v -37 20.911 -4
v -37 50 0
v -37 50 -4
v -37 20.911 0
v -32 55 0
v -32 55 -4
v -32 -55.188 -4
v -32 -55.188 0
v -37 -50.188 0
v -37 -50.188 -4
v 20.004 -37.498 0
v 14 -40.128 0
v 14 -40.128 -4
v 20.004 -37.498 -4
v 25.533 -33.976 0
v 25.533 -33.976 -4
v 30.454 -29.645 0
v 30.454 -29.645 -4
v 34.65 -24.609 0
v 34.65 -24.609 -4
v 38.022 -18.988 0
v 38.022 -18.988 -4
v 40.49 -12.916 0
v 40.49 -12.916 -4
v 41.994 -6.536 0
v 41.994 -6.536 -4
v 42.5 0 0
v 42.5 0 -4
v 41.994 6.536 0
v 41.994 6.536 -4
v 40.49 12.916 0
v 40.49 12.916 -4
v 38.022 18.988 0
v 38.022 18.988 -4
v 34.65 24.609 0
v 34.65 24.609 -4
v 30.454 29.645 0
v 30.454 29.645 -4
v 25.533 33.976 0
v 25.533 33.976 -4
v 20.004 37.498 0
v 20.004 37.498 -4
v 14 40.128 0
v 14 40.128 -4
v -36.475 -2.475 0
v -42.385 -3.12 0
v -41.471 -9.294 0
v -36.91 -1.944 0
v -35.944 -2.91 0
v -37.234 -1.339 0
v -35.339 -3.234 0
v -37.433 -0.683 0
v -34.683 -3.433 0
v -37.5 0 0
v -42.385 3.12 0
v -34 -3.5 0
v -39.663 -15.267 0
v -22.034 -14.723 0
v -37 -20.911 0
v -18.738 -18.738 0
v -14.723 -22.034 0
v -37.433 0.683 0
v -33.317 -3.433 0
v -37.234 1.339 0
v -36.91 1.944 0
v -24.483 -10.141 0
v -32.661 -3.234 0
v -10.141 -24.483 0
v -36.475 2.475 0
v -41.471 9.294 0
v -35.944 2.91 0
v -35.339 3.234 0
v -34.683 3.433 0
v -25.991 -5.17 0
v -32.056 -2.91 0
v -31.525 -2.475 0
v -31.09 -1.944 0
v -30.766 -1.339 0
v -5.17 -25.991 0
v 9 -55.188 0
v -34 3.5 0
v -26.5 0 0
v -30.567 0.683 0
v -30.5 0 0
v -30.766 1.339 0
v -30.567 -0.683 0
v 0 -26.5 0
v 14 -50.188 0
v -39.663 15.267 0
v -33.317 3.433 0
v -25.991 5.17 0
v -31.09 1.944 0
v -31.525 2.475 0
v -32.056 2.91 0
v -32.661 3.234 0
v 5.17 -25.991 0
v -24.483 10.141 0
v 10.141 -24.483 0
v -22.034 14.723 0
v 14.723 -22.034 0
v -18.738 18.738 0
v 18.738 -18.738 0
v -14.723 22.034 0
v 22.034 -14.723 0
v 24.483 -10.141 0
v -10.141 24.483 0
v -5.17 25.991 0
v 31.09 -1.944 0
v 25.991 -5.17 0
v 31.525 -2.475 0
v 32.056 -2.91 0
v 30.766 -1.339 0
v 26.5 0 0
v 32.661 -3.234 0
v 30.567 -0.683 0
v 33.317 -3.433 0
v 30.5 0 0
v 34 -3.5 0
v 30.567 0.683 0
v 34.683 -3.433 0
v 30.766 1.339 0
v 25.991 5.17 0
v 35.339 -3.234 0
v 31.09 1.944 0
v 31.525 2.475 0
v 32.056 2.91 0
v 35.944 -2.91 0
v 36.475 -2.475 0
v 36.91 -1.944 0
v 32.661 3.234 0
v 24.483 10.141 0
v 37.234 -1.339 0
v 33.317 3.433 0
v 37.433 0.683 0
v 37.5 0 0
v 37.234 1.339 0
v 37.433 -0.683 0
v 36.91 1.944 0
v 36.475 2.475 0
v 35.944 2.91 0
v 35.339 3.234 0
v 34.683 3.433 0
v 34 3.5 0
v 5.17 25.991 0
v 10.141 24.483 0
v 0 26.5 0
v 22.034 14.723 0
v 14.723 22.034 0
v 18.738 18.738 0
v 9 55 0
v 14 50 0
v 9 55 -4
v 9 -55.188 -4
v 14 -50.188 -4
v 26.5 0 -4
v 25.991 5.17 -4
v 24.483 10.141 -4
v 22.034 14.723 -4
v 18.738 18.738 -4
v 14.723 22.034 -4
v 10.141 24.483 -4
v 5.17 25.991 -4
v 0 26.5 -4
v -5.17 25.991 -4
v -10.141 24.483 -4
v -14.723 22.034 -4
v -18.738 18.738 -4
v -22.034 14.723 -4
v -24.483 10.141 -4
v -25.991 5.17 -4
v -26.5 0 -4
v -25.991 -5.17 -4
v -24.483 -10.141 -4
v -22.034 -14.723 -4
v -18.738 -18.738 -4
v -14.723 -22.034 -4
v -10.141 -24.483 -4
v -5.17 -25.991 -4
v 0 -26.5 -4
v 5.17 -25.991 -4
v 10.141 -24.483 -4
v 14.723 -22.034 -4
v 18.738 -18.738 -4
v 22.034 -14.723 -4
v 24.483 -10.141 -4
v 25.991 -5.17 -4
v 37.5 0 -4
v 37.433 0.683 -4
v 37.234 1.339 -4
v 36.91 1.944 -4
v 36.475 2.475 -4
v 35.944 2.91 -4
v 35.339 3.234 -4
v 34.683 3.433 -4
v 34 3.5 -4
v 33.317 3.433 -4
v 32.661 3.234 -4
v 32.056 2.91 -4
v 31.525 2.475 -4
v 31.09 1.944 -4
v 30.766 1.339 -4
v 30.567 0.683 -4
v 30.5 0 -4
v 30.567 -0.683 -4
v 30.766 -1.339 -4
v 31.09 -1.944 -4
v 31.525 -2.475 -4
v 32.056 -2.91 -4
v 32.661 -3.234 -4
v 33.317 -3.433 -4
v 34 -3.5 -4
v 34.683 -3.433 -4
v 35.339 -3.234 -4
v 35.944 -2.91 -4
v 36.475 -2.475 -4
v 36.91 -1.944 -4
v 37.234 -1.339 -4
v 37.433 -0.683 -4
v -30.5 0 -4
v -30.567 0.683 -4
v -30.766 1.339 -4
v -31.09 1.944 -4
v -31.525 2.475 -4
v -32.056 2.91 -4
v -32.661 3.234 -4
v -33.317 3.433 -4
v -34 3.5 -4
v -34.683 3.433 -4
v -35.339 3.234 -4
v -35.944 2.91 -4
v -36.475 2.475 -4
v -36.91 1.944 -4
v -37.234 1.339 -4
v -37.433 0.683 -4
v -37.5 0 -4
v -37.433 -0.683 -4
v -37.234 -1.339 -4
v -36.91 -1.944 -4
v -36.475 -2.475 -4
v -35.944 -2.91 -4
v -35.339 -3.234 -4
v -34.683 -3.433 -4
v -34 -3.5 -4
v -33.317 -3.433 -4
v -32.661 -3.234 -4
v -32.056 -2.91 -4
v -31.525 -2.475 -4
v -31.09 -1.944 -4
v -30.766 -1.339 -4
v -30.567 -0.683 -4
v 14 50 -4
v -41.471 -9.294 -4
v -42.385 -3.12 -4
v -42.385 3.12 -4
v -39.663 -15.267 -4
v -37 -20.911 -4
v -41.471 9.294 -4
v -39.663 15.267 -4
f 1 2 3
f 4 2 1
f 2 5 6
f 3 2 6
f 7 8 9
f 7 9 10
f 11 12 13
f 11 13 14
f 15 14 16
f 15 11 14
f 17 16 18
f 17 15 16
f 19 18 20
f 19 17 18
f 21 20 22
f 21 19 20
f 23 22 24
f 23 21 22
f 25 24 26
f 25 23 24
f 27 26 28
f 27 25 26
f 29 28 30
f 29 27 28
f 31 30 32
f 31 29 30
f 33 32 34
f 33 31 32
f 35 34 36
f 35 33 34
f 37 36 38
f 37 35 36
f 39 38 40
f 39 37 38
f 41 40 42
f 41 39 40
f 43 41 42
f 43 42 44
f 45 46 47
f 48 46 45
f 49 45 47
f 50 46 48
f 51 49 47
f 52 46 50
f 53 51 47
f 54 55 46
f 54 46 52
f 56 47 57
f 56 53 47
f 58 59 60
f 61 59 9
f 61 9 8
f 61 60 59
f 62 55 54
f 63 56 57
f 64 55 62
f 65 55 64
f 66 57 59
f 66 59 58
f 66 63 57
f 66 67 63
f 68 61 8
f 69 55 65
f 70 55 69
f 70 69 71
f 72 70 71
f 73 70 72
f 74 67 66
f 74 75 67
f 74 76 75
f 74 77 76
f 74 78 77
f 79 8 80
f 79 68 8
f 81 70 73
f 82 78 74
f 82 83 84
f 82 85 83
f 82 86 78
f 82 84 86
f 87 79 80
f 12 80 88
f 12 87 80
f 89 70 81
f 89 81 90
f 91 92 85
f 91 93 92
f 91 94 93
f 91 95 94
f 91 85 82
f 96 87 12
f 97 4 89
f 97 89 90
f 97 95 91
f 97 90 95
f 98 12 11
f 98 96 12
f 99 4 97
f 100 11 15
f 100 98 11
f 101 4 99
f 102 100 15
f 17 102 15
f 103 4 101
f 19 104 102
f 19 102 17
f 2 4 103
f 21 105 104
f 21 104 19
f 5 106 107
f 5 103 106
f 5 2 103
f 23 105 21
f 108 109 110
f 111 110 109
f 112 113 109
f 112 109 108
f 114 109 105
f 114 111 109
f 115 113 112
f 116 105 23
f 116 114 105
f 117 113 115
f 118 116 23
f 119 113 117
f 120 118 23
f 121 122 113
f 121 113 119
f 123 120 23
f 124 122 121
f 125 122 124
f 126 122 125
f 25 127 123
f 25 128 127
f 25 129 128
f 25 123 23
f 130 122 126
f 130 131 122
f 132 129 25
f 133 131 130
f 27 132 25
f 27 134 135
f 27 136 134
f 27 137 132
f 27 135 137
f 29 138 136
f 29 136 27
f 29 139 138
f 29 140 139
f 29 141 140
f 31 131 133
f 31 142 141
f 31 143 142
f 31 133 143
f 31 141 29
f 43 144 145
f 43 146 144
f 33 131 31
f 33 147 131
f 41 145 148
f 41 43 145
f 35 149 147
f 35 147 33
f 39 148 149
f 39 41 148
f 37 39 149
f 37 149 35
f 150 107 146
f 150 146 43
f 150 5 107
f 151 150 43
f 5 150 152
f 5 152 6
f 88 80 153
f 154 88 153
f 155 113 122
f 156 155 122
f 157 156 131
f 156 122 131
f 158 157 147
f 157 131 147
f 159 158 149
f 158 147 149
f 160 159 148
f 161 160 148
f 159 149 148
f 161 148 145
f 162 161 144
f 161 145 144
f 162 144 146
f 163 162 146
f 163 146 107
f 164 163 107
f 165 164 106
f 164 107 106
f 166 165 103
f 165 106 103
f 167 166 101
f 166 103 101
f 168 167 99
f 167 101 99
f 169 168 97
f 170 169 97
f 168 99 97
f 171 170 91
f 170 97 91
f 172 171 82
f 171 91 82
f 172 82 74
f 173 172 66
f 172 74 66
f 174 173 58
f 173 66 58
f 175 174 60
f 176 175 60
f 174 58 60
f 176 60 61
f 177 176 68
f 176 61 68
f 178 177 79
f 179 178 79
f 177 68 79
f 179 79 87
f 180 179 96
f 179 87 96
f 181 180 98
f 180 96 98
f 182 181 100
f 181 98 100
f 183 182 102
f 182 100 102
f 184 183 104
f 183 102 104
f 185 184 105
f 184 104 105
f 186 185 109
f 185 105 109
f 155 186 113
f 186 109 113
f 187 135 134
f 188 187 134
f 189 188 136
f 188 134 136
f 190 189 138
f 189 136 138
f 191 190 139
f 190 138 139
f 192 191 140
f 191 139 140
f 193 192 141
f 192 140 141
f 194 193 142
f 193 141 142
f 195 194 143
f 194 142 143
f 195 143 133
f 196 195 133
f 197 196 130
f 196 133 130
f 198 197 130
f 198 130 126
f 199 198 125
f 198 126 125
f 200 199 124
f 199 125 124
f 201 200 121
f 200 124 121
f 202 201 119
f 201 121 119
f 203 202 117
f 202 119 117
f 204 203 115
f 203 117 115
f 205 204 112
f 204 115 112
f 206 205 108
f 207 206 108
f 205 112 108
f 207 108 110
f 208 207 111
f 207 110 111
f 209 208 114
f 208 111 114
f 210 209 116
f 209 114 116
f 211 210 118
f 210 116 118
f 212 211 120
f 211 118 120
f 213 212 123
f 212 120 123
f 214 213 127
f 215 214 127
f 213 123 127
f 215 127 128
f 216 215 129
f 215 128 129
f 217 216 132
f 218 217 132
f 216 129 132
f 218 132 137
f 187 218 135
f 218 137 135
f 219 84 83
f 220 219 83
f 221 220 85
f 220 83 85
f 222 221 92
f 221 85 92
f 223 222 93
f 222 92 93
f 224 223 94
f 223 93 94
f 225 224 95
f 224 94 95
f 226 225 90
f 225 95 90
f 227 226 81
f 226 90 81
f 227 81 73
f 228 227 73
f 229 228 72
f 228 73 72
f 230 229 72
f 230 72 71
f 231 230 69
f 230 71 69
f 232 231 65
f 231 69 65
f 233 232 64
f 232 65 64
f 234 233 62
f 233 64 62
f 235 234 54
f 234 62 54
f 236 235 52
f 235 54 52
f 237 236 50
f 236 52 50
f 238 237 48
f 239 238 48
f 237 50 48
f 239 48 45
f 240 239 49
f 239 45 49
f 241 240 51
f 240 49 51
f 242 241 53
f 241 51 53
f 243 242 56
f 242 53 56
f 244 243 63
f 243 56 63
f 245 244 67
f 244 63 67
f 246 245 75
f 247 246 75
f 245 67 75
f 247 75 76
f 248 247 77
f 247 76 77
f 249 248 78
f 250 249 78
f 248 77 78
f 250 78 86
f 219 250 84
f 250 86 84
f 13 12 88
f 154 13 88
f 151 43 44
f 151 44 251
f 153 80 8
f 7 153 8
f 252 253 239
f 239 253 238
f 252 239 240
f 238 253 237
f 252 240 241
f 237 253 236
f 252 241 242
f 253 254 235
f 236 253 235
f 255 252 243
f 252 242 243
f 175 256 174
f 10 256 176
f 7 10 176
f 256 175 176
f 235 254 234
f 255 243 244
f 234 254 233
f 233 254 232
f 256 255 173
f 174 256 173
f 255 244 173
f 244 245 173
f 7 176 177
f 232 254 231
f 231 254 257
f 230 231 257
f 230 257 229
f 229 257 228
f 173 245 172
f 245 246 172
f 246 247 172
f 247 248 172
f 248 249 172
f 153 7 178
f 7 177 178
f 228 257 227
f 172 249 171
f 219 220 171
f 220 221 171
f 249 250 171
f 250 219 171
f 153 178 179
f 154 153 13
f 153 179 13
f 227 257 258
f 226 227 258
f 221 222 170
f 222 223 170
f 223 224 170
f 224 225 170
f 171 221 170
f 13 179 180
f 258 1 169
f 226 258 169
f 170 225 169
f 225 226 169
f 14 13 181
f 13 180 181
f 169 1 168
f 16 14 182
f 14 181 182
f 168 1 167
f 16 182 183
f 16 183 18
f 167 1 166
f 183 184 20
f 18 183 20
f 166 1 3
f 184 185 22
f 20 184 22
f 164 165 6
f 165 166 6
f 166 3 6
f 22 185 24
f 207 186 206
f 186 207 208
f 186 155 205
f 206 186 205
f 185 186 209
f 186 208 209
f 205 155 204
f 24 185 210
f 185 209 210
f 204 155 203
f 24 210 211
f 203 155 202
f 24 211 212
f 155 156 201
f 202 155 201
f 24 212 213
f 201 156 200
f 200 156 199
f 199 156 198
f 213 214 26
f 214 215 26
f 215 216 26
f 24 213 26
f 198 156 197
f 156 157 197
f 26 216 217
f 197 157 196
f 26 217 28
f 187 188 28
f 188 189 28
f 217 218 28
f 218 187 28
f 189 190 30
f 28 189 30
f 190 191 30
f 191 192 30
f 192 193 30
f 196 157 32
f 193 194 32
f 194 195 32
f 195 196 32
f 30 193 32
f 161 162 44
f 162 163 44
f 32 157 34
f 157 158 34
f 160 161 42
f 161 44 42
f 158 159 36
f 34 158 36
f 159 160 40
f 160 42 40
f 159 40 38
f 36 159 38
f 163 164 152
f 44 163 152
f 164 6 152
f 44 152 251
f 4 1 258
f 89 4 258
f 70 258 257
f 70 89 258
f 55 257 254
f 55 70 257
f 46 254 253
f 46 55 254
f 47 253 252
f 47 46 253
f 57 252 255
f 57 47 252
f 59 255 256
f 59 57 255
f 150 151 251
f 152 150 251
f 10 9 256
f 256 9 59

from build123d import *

# Parameters (mm, degrees)
SKETCH1_R           = 42.5
SKETCH1_R_2         = 26.5
SKETCH1_R_3         = 3.5
BOSS_EXTRUDE1_DEPTH = 4
BOSS_EXTRUDE2_DEPTH = 4
CHAMFER1_SIZE       = 5


with BuildPart() as part:
    # Sketch1 → Boss-Extrude1 (new body)
    with BuildSketch(Plane.XY):
        Circle(SKETCH1_R)
        Circle(SKETCH1_R_2, mode=Mode.SUBTRACT)
        with Locations((34, 0)):
            Circle(SKETCH1_R_3, mode=Mode.SUBTRACT)
        with Locations((-34, 0)):
            Circle(SKETCH1_R_3, mode=Mode.SUBTRACT)
    extrude(amount=-BOSS_EXTRUDE1_DEPTH)

    # Sketch2 → Boss-Extrude2 (add)
    with BuildSketch(Plane.XY):
        Polygon((-37, 55), (-37, 20.910523666), (14, 40.127920454), (14, 55), align=None)
        Polygon((-37, -55.188269352), (-37, -20.910523666), (14, -40.127920454), (14, -55.188269352), align=None)
    extrude(amount=-BOSS_EXTRUDE2_DEPTH)

    # Chamfer1
    chamfer1_edges = [part.edges().sort_by_distance(p)[0] for p in [
        (-37, 55, -2),
        (14, 55, -2),
        (14, -55.188269352, -2),
        (-37, -55.188269352, -2),
    ]]
    chamfer(chamfer1_edges, length=CHAMFER1_SIZE)


solid = part.part
